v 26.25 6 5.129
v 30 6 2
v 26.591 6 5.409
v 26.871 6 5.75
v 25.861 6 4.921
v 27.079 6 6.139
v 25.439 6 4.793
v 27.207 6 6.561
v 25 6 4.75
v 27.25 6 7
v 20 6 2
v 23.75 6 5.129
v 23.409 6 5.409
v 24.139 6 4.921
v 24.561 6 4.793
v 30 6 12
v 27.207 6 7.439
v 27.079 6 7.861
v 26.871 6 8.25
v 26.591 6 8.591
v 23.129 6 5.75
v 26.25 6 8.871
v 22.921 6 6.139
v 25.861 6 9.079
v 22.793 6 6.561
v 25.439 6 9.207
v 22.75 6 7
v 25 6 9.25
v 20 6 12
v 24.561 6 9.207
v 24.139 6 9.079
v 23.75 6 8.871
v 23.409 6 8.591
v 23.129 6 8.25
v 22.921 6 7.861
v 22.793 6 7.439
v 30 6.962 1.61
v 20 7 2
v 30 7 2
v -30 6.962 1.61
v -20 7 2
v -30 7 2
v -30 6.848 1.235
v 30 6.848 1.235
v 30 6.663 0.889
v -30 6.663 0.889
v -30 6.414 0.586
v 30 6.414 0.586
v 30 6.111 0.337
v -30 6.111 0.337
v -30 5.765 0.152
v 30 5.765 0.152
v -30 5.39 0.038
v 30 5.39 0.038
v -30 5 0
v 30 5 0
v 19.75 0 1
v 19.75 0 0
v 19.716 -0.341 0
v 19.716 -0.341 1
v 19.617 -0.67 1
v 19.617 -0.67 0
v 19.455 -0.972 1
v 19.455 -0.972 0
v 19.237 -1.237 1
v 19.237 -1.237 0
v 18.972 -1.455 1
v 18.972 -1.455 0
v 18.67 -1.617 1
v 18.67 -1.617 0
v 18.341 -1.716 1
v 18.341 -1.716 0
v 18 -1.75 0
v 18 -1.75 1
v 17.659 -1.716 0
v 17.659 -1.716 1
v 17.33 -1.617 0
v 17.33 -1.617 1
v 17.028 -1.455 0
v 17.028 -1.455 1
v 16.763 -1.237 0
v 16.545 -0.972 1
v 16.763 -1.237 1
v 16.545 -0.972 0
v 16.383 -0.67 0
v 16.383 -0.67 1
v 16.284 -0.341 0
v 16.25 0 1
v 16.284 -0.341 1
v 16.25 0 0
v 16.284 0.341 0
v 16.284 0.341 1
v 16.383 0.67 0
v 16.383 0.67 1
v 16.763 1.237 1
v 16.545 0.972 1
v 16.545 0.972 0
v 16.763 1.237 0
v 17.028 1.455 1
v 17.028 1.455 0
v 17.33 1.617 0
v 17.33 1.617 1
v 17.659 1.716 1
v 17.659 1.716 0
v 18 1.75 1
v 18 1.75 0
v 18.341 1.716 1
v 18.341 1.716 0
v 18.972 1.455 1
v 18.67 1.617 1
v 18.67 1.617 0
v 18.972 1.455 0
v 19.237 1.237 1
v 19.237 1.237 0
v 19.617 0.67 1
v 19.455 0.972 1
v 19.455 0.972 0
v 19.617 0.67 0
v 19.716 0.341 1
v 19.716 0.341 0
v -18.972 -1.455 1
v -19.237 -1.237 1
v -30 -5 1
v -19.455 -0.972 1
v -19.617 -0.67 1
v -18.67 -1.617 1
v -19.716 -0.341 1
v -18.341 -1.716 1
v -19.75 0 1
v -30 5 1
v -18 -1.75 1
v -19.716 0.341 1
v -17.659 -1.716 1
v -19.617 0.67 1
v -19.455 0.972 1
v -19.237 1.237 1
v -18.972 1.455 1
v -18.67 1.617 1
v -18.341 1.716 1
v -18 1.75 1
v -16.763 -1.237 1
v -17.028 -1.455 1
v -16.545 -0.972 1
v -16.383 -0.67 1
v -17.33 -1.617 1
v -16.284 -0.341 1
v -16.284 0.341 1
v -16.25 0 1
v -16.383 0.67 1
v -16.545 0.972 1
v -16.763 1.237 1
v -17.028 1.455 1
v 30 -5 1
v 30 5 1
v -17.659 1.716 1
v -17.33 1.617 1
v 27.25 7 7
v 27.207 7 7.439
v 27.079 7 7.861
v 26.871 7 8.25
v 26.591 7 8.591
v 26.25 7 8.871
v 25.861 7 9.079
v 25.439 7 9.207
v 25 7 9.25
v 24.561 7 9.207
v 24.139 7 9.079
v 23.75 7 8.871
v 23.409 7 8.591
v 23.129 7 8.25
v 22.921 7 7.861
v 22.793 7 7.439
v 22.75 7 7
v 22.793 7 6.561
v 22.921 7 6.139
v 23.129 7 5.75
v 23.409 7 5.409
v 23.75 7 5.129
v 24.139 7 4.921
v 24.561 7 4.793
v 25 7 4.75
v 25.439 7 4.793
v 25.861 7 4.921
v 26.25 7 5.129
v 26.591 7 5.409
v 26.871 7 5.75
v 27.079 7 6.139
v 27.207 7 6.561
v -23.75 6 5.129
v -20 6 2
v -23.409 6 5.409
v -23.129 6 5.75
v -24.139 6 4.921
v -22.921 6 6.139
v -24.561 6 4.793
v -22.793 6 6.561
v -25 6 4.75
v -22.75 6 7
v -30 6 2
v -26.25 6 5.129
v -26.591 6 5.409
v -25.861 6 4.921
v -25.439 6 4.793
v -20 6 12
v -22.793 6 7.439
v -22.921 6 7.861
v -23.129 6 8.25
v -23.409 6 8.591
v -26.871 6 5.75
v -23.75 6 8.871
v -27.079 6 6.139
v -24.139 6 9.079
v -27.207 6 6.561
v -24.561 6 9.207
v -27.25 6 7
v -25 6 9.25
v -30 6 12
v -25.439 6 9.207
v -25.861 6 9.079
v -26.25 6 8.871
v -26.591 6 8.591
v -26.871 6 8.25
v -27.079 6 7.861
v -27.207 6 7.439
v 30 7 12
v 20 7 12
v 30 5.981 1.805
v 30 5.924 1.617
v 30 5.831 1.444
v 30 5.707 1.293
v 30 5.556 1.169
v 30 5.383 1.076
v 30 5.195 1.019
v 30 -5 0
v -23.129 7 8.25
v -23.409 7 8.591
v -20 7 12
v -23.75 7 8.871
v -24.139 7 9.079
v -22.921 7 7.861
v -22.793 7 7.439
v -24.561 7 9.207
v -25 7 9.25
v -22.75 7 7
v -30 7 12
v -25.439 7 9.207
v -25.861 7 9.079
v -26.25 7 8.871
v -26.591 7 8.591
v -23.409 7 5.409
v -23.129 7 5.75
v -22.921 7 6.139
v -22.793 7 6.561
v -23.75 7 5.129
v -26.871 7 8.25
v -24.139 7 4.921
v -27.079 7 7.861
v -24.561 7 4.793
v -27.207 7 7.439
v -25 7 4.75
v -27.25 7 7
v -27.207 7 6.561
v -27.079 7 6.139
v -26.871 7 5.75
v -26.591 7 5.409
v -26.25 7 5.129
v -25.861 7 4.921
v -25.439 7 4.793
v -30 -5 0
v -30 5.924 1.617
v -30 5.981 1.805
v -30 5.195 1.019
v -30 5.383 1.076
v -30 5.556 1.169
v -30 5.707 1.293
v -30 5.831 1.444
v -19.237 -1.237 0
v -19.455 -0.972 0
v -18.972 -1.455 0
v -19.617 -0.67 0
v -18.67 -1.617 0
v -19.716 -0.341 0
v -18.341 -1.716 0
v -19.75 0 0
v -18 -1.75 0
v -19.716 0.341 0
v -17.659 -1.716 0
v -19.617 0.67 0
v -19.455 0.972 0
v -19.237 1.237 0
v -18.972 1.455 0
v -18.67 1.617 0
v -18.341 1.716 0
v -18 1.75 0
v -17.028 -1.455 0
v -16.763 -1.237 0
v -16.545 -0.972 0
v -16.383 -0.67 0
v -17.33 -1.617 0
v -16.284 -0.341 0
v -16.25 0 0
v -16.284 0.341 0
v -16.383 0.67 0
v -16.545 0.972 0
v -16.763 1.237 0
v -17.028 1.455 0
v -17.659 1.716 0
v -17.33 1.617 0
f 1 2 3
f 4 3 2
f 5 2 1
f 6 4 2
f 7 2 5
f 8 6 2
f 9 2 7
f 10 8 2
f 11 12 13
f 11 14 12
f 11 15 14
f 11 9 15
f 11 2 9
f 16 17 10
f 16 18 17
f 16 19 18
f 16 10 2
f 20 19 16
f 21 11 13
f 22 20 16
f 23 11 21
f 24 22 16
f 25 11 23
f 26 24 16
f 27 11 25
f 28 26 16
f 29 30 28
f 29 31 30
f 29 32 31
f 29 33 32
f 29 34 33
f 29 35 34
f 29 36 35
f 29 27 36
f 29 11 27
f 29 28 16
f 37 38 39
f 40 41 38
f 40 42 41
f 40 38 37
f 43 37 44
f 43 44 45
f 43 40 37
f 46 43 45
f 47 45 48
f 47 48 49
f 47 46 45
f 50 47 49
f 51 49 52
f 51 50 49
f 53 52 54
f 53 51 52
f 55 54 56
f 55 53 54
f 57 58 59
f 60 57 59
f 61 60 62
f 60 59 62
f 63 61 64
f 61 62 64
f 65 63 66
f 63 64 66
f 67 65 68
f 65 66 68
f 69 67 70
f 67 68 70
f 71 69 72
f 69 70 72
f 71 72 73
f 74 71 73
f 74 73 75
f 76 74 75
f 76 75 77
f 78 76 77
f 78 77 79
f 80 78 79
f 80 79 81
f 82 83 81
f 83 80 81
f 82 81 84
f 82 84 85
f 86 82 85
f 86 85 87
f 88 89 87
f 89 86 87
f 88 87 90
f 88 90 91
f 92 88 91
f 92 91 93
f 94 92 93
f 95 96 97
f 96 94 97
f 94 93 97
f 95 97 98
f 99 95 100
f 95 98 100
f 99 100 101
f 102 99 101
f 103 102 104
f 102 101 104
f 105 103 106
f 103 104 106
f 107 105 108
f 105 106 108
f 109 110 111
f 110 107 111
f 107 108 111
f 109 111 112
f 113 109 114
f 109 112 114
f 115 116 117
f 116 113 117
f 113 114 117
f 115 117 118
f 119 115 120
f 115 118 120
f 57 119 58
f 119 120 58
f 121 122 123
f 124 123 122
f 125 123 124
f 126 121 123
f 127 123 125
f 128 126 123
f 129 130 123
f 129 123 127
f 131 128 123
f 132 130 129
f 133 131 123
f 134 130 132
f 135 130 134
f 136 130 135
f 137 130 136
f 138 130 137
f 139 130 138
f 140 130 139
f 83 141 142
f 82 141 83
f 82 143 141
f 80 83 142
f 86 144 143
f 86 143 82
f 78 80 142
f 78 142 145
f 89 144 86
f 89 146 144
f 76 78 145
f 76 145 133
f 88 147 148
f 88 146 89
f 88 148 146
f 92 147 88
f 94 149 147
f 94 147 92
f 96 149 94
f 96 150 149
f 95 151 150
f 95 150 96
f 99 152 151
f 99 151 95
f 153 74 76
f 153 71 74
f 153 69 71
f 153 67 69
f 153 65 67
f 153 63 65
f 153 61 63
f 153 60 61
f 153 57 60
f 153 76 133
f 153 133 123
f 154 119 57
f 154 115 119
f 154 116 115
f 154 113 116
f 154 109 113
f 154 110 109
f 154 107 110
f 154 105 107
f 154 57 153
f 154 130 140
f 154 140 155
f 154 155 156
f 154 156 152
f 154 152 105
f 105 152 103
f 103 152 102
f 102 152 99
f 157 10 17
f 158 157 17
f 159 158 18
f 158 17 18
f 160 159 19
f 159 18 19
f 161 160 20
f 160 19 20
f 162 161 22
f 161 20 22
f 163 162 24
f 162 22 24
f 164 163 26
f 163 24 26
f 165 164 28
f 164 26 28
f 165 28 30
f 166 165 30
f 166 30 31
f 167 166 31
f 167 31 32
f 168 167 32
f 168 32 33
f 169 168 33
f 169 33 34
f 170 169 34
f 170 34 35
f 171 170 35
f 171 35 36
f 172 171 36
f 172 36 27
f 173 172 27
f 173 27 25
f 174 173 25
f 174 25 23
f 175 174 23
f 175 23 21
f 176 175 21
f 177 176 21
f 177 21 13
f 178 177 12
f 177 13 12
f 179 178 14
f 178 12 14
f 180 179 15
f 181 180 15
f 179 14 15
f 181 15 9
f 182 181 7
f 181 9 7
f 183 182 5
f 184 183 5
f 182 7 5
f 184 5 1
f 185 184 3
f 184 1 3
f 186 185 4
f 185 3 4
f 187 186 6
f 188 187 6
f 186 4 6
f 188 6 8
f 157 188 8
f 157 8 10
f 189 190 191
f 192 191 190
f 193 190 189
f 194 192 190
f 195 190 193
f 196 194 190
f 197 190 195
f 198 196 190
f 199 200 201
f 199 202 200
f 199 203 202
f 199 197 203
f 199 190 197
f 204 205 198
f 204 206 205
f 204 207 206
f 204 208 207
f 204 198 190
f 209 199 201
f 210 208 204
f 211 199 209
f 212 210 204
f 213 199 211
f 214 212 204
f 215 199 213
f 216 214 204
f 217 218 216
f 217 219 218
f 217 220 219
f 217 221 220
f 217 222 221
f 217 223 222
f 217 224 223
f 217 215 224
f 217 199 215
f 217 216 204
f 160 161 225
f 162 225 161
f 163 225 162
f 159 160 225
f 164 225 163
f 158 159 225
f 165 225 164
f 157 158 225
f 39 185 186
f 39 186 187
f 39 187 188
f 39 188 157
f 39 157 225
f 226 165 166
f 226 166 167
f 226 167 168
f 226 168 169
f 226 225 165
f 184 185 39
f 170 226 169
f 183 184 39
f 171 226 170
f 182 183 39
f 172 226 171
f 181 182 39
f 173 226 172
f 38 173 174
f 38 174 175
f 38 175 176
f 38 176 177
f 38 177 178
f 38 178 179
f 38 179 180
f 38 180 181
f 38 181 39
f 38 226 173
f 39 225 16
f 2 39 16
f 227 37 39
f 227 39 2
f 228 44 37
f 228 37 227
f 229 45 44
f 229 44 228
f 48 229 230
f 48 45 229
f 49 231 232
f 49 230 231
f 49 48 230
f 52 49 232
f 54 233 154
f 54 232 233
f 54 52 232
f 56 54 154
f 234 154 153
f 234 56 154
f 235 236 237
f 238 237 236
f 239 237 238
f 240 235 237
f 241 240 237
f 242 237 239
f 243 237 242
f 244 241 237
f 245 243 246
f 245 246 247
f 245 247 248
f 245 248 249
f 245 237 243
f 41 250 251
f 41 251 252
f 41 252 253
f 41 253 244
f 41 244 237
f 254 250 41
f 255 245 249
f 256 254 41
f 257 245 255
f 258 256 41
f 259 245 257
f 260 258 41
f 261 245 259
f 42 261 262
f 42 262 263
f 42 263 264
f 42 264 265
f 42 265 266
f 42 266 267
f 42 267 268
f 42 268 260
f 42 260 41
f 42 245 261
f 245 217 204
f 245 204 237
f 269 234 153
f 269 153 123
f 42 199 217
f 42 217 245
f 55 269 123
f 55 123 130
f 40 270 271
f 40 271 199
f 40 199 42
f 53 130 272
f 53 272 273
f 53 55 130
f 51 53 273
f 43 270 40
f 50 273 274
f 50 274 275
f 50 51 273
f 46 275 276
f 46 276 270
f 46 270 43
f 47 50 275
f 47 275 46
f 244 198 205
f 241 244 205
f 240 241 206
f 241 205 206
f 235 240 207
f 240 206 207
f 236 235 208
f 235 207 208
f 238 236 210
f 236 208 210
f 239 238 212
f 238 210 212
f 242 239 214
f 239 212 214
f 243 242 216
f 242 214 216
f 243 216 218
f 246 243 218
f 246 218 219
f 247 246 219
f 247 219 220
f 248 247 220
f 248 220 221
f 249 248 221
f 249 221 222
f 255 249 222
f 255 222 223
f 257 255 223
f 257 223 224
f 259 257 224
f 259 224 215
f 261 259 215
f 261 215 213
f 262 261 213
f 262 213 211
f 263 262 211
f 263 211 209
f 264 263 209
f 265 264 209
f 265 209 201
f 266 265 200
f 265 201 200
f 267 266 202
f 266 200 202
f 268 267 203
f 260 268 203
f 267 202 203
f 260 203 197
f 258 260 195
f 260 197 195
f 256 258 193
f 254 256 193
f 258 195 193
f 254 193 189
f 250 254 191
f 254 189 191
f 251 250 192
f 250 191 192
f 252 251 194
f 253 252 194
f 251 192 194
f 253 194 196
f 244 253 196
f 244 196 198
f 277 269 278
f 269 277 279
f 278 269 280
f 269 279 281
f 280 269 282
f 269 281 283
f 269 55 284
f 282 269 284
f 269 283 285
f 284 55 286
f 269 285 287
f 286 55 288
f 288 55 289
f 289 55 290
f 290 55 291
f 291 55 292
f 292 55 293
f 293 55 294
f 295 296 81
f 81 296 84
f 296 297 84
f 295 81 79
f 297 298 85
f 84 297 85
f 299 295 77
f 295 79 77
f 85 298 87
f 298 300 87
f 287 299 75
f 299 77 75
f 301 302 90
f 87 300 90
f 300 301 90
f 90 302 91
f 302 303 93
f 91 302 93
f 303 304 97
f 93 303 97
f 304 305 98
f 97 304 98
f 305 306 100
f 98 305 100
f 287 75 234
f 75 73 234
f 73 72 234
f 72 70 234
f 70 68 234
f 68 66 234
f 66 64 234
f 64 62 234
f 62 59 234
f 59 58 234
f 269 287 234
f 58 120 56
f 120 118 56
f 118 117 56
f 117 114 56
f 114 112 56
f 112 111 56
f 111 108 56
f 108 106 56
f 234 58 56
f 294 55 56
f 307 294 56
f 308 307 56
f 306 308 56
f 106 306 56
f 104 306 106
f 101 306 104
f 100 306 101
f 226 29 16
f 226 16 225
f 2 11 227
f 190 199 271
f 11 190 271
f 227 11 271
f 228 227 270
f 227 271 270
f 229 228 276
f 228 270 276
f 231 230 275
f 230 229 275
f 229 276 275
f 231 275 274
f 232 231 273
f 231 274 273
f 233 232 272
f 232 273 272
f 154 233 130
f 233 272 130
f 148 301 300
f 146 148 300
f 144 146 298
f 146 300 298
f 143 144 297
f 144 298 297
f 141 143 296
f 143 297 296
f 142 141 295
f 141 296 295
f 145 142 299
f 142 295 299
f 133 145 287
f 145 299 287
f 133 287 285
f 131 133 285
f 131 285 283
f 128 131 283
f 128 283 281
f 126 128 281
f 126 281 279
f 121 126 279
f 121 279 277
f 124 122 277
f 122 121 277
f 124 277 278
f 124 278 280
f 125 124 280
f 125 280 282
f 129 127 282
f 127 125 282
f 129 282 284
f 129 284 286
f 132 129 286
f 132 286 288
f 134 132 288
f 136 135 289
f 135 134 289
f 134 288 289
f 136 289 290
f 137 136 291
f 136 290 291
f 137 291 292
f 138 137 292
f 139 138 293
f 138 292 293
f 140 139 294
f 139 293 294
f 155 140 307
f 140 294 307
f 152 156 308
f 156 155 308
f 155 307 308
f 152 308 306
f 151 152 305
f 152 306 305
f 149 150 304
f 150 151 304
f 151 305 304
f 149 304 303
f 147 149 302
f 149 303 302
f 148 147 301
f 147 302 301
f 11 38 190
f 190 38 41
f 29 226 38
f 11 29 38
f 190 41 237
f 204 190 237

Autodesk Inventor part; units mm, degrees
ref_plane "YZ Plane" through (0, 0, 0) normal (1, 0, 0) x (0, 1, 0)
ref_plane "XZ Plane" through (0, 0, 0) normal (0, 1, 0) x (-1, 0, 0)
ref_plane "XY Plane" through (0, 0, 0) normal (0, 0, 1) x (1, 0, 0)
sketch "Sketch1" plane through (0, 0, 0) normal (0, 0, 1) x (1, 0, 0)
  line L0 (-30, 5) -> (30, 5)
  line L1 (30, 5) -> (30, -5)
  line L2 (30, -5) -> (-30, -5)
  line L3 (-30, -5) -> (-30, 5)
  line L4 (-30, 5) -> (30, -5) construction
  line L5 (30, 5) -> (-30, -5) construction
  circle A0 centre (-18, 0) radius 1.75
  line L6 (0, 0) -> (0, -5.5046) construction
  circle A1 centre (18, 0) radius 1.75
  dimension "d0" = 60
  dimension "d1" = 10
  dimension "d2" = 3.5
  dimension "d3" = 36
  dimension "d4" = 5
extrude "Plate1" add sketch "Sketch1" along normal blind 1
sketch "Sketch2" plane through (-30, 6, 2) normal (0, 1, 0) x (-1, 0, 0)
  line L0 (-60, 0) -> (0, 0)
  line L1 (0, 0) -> (0, 10)
  line L2 (0, 10) -> (-60, 10)
  line L3 (-60, 10) -> (-60, 0)
edge flange "Flange1" height 12 angle 90 thickness 1 bend radius 1 thickness toward (0, 1, 0) relief tear relief width 1 relief depth 0.5 edges at (0, 5, 1) wall of the first edge with corners at (30, 6, 2) (-30, 6, 2) (-30, 6, 12) (30, 6, 12)
bend "Bend1"
corner "Corner1"
sketch "Sketch3" plane through (-30, 6, 12) normal (0, -1, 0) x (1, 0, 0)
  circle A0 centre (55, -5) radius 2.25
  circle A1 centre (5, -5) radius 2.25
  line L0 (30, -12) -> (30, 5.1941) construction
  line L1 (60, -11) -> (0, -11) construction
  dimension "d20" = 4.5
  dimension "d21" = 4.5
  dimension "d22" = 50
  dimension "d23" = 6
extrude "Cut1" cut sketch "Sketch3" against normal blind 1
sketch "Sketch4" plane through (-30, 7, 12) normal (0, 1, 0) x (1, 0, 0)
  line L0 (60, 0) -> (0, 0) projected
  line L1 (50, 10) -> (10, 10)
  line L2 (10, 10) -> (10, 0)
  line L3 (10, 0) -> (50, 0)
  line L4 (50, 0) -> (50, 10)
  line L5 (50, 10) -> (10, 0) construction
  line L6 (10, 10) -> (50, 0) construction
  line L7 (60, 10) -> (0, 10) projected
  point P0 (30, 12)
  point P1 (30, 5)
  dimension "d26" = 40
extrude "Cut2" cut sketch "Sketch4" against normal blind 1
equation "\"d20\" = d21"
equation "\"d24\" = 厚度"
equation "\"d27\" = 厚度"
equation "\"d9\" = 厚度"
equation "\"d10\" = 折彎離隙寬度"
equation "\"d11\" = 折彎離隙深度"
equation "\"d12\" = 最小剩餘"
equation "\"d13\" = 轉移半徑"
equation "\"d16\" = 折彎半徑"
equation "\"d17\" = 轉角離隙大小"
equation "\"d18\" = 間隙大小"
equation "\"d19\" = Jacobi半徑大小"
equation "\"折彎半徑\" = 厚度"
equation "\"折彎離隙寬度\" = 厚度"
equation "\"折彎離隙深度\" = 0.5 * 厚度"
equation "\"轉角離隙大小\" = 4 * 厚度"
equation "\"最小剩餘\" = 2 * 厚度"
equation "\"轉移半徑\" = 折彎半徑"
equation "\"Jacobi半徑大小\" = 折彎半徑"
equation "\"間隙大小\" = 厚度"
equation "\"厚度\" = 1"
properties part number "fan_fix_plate_connect"
